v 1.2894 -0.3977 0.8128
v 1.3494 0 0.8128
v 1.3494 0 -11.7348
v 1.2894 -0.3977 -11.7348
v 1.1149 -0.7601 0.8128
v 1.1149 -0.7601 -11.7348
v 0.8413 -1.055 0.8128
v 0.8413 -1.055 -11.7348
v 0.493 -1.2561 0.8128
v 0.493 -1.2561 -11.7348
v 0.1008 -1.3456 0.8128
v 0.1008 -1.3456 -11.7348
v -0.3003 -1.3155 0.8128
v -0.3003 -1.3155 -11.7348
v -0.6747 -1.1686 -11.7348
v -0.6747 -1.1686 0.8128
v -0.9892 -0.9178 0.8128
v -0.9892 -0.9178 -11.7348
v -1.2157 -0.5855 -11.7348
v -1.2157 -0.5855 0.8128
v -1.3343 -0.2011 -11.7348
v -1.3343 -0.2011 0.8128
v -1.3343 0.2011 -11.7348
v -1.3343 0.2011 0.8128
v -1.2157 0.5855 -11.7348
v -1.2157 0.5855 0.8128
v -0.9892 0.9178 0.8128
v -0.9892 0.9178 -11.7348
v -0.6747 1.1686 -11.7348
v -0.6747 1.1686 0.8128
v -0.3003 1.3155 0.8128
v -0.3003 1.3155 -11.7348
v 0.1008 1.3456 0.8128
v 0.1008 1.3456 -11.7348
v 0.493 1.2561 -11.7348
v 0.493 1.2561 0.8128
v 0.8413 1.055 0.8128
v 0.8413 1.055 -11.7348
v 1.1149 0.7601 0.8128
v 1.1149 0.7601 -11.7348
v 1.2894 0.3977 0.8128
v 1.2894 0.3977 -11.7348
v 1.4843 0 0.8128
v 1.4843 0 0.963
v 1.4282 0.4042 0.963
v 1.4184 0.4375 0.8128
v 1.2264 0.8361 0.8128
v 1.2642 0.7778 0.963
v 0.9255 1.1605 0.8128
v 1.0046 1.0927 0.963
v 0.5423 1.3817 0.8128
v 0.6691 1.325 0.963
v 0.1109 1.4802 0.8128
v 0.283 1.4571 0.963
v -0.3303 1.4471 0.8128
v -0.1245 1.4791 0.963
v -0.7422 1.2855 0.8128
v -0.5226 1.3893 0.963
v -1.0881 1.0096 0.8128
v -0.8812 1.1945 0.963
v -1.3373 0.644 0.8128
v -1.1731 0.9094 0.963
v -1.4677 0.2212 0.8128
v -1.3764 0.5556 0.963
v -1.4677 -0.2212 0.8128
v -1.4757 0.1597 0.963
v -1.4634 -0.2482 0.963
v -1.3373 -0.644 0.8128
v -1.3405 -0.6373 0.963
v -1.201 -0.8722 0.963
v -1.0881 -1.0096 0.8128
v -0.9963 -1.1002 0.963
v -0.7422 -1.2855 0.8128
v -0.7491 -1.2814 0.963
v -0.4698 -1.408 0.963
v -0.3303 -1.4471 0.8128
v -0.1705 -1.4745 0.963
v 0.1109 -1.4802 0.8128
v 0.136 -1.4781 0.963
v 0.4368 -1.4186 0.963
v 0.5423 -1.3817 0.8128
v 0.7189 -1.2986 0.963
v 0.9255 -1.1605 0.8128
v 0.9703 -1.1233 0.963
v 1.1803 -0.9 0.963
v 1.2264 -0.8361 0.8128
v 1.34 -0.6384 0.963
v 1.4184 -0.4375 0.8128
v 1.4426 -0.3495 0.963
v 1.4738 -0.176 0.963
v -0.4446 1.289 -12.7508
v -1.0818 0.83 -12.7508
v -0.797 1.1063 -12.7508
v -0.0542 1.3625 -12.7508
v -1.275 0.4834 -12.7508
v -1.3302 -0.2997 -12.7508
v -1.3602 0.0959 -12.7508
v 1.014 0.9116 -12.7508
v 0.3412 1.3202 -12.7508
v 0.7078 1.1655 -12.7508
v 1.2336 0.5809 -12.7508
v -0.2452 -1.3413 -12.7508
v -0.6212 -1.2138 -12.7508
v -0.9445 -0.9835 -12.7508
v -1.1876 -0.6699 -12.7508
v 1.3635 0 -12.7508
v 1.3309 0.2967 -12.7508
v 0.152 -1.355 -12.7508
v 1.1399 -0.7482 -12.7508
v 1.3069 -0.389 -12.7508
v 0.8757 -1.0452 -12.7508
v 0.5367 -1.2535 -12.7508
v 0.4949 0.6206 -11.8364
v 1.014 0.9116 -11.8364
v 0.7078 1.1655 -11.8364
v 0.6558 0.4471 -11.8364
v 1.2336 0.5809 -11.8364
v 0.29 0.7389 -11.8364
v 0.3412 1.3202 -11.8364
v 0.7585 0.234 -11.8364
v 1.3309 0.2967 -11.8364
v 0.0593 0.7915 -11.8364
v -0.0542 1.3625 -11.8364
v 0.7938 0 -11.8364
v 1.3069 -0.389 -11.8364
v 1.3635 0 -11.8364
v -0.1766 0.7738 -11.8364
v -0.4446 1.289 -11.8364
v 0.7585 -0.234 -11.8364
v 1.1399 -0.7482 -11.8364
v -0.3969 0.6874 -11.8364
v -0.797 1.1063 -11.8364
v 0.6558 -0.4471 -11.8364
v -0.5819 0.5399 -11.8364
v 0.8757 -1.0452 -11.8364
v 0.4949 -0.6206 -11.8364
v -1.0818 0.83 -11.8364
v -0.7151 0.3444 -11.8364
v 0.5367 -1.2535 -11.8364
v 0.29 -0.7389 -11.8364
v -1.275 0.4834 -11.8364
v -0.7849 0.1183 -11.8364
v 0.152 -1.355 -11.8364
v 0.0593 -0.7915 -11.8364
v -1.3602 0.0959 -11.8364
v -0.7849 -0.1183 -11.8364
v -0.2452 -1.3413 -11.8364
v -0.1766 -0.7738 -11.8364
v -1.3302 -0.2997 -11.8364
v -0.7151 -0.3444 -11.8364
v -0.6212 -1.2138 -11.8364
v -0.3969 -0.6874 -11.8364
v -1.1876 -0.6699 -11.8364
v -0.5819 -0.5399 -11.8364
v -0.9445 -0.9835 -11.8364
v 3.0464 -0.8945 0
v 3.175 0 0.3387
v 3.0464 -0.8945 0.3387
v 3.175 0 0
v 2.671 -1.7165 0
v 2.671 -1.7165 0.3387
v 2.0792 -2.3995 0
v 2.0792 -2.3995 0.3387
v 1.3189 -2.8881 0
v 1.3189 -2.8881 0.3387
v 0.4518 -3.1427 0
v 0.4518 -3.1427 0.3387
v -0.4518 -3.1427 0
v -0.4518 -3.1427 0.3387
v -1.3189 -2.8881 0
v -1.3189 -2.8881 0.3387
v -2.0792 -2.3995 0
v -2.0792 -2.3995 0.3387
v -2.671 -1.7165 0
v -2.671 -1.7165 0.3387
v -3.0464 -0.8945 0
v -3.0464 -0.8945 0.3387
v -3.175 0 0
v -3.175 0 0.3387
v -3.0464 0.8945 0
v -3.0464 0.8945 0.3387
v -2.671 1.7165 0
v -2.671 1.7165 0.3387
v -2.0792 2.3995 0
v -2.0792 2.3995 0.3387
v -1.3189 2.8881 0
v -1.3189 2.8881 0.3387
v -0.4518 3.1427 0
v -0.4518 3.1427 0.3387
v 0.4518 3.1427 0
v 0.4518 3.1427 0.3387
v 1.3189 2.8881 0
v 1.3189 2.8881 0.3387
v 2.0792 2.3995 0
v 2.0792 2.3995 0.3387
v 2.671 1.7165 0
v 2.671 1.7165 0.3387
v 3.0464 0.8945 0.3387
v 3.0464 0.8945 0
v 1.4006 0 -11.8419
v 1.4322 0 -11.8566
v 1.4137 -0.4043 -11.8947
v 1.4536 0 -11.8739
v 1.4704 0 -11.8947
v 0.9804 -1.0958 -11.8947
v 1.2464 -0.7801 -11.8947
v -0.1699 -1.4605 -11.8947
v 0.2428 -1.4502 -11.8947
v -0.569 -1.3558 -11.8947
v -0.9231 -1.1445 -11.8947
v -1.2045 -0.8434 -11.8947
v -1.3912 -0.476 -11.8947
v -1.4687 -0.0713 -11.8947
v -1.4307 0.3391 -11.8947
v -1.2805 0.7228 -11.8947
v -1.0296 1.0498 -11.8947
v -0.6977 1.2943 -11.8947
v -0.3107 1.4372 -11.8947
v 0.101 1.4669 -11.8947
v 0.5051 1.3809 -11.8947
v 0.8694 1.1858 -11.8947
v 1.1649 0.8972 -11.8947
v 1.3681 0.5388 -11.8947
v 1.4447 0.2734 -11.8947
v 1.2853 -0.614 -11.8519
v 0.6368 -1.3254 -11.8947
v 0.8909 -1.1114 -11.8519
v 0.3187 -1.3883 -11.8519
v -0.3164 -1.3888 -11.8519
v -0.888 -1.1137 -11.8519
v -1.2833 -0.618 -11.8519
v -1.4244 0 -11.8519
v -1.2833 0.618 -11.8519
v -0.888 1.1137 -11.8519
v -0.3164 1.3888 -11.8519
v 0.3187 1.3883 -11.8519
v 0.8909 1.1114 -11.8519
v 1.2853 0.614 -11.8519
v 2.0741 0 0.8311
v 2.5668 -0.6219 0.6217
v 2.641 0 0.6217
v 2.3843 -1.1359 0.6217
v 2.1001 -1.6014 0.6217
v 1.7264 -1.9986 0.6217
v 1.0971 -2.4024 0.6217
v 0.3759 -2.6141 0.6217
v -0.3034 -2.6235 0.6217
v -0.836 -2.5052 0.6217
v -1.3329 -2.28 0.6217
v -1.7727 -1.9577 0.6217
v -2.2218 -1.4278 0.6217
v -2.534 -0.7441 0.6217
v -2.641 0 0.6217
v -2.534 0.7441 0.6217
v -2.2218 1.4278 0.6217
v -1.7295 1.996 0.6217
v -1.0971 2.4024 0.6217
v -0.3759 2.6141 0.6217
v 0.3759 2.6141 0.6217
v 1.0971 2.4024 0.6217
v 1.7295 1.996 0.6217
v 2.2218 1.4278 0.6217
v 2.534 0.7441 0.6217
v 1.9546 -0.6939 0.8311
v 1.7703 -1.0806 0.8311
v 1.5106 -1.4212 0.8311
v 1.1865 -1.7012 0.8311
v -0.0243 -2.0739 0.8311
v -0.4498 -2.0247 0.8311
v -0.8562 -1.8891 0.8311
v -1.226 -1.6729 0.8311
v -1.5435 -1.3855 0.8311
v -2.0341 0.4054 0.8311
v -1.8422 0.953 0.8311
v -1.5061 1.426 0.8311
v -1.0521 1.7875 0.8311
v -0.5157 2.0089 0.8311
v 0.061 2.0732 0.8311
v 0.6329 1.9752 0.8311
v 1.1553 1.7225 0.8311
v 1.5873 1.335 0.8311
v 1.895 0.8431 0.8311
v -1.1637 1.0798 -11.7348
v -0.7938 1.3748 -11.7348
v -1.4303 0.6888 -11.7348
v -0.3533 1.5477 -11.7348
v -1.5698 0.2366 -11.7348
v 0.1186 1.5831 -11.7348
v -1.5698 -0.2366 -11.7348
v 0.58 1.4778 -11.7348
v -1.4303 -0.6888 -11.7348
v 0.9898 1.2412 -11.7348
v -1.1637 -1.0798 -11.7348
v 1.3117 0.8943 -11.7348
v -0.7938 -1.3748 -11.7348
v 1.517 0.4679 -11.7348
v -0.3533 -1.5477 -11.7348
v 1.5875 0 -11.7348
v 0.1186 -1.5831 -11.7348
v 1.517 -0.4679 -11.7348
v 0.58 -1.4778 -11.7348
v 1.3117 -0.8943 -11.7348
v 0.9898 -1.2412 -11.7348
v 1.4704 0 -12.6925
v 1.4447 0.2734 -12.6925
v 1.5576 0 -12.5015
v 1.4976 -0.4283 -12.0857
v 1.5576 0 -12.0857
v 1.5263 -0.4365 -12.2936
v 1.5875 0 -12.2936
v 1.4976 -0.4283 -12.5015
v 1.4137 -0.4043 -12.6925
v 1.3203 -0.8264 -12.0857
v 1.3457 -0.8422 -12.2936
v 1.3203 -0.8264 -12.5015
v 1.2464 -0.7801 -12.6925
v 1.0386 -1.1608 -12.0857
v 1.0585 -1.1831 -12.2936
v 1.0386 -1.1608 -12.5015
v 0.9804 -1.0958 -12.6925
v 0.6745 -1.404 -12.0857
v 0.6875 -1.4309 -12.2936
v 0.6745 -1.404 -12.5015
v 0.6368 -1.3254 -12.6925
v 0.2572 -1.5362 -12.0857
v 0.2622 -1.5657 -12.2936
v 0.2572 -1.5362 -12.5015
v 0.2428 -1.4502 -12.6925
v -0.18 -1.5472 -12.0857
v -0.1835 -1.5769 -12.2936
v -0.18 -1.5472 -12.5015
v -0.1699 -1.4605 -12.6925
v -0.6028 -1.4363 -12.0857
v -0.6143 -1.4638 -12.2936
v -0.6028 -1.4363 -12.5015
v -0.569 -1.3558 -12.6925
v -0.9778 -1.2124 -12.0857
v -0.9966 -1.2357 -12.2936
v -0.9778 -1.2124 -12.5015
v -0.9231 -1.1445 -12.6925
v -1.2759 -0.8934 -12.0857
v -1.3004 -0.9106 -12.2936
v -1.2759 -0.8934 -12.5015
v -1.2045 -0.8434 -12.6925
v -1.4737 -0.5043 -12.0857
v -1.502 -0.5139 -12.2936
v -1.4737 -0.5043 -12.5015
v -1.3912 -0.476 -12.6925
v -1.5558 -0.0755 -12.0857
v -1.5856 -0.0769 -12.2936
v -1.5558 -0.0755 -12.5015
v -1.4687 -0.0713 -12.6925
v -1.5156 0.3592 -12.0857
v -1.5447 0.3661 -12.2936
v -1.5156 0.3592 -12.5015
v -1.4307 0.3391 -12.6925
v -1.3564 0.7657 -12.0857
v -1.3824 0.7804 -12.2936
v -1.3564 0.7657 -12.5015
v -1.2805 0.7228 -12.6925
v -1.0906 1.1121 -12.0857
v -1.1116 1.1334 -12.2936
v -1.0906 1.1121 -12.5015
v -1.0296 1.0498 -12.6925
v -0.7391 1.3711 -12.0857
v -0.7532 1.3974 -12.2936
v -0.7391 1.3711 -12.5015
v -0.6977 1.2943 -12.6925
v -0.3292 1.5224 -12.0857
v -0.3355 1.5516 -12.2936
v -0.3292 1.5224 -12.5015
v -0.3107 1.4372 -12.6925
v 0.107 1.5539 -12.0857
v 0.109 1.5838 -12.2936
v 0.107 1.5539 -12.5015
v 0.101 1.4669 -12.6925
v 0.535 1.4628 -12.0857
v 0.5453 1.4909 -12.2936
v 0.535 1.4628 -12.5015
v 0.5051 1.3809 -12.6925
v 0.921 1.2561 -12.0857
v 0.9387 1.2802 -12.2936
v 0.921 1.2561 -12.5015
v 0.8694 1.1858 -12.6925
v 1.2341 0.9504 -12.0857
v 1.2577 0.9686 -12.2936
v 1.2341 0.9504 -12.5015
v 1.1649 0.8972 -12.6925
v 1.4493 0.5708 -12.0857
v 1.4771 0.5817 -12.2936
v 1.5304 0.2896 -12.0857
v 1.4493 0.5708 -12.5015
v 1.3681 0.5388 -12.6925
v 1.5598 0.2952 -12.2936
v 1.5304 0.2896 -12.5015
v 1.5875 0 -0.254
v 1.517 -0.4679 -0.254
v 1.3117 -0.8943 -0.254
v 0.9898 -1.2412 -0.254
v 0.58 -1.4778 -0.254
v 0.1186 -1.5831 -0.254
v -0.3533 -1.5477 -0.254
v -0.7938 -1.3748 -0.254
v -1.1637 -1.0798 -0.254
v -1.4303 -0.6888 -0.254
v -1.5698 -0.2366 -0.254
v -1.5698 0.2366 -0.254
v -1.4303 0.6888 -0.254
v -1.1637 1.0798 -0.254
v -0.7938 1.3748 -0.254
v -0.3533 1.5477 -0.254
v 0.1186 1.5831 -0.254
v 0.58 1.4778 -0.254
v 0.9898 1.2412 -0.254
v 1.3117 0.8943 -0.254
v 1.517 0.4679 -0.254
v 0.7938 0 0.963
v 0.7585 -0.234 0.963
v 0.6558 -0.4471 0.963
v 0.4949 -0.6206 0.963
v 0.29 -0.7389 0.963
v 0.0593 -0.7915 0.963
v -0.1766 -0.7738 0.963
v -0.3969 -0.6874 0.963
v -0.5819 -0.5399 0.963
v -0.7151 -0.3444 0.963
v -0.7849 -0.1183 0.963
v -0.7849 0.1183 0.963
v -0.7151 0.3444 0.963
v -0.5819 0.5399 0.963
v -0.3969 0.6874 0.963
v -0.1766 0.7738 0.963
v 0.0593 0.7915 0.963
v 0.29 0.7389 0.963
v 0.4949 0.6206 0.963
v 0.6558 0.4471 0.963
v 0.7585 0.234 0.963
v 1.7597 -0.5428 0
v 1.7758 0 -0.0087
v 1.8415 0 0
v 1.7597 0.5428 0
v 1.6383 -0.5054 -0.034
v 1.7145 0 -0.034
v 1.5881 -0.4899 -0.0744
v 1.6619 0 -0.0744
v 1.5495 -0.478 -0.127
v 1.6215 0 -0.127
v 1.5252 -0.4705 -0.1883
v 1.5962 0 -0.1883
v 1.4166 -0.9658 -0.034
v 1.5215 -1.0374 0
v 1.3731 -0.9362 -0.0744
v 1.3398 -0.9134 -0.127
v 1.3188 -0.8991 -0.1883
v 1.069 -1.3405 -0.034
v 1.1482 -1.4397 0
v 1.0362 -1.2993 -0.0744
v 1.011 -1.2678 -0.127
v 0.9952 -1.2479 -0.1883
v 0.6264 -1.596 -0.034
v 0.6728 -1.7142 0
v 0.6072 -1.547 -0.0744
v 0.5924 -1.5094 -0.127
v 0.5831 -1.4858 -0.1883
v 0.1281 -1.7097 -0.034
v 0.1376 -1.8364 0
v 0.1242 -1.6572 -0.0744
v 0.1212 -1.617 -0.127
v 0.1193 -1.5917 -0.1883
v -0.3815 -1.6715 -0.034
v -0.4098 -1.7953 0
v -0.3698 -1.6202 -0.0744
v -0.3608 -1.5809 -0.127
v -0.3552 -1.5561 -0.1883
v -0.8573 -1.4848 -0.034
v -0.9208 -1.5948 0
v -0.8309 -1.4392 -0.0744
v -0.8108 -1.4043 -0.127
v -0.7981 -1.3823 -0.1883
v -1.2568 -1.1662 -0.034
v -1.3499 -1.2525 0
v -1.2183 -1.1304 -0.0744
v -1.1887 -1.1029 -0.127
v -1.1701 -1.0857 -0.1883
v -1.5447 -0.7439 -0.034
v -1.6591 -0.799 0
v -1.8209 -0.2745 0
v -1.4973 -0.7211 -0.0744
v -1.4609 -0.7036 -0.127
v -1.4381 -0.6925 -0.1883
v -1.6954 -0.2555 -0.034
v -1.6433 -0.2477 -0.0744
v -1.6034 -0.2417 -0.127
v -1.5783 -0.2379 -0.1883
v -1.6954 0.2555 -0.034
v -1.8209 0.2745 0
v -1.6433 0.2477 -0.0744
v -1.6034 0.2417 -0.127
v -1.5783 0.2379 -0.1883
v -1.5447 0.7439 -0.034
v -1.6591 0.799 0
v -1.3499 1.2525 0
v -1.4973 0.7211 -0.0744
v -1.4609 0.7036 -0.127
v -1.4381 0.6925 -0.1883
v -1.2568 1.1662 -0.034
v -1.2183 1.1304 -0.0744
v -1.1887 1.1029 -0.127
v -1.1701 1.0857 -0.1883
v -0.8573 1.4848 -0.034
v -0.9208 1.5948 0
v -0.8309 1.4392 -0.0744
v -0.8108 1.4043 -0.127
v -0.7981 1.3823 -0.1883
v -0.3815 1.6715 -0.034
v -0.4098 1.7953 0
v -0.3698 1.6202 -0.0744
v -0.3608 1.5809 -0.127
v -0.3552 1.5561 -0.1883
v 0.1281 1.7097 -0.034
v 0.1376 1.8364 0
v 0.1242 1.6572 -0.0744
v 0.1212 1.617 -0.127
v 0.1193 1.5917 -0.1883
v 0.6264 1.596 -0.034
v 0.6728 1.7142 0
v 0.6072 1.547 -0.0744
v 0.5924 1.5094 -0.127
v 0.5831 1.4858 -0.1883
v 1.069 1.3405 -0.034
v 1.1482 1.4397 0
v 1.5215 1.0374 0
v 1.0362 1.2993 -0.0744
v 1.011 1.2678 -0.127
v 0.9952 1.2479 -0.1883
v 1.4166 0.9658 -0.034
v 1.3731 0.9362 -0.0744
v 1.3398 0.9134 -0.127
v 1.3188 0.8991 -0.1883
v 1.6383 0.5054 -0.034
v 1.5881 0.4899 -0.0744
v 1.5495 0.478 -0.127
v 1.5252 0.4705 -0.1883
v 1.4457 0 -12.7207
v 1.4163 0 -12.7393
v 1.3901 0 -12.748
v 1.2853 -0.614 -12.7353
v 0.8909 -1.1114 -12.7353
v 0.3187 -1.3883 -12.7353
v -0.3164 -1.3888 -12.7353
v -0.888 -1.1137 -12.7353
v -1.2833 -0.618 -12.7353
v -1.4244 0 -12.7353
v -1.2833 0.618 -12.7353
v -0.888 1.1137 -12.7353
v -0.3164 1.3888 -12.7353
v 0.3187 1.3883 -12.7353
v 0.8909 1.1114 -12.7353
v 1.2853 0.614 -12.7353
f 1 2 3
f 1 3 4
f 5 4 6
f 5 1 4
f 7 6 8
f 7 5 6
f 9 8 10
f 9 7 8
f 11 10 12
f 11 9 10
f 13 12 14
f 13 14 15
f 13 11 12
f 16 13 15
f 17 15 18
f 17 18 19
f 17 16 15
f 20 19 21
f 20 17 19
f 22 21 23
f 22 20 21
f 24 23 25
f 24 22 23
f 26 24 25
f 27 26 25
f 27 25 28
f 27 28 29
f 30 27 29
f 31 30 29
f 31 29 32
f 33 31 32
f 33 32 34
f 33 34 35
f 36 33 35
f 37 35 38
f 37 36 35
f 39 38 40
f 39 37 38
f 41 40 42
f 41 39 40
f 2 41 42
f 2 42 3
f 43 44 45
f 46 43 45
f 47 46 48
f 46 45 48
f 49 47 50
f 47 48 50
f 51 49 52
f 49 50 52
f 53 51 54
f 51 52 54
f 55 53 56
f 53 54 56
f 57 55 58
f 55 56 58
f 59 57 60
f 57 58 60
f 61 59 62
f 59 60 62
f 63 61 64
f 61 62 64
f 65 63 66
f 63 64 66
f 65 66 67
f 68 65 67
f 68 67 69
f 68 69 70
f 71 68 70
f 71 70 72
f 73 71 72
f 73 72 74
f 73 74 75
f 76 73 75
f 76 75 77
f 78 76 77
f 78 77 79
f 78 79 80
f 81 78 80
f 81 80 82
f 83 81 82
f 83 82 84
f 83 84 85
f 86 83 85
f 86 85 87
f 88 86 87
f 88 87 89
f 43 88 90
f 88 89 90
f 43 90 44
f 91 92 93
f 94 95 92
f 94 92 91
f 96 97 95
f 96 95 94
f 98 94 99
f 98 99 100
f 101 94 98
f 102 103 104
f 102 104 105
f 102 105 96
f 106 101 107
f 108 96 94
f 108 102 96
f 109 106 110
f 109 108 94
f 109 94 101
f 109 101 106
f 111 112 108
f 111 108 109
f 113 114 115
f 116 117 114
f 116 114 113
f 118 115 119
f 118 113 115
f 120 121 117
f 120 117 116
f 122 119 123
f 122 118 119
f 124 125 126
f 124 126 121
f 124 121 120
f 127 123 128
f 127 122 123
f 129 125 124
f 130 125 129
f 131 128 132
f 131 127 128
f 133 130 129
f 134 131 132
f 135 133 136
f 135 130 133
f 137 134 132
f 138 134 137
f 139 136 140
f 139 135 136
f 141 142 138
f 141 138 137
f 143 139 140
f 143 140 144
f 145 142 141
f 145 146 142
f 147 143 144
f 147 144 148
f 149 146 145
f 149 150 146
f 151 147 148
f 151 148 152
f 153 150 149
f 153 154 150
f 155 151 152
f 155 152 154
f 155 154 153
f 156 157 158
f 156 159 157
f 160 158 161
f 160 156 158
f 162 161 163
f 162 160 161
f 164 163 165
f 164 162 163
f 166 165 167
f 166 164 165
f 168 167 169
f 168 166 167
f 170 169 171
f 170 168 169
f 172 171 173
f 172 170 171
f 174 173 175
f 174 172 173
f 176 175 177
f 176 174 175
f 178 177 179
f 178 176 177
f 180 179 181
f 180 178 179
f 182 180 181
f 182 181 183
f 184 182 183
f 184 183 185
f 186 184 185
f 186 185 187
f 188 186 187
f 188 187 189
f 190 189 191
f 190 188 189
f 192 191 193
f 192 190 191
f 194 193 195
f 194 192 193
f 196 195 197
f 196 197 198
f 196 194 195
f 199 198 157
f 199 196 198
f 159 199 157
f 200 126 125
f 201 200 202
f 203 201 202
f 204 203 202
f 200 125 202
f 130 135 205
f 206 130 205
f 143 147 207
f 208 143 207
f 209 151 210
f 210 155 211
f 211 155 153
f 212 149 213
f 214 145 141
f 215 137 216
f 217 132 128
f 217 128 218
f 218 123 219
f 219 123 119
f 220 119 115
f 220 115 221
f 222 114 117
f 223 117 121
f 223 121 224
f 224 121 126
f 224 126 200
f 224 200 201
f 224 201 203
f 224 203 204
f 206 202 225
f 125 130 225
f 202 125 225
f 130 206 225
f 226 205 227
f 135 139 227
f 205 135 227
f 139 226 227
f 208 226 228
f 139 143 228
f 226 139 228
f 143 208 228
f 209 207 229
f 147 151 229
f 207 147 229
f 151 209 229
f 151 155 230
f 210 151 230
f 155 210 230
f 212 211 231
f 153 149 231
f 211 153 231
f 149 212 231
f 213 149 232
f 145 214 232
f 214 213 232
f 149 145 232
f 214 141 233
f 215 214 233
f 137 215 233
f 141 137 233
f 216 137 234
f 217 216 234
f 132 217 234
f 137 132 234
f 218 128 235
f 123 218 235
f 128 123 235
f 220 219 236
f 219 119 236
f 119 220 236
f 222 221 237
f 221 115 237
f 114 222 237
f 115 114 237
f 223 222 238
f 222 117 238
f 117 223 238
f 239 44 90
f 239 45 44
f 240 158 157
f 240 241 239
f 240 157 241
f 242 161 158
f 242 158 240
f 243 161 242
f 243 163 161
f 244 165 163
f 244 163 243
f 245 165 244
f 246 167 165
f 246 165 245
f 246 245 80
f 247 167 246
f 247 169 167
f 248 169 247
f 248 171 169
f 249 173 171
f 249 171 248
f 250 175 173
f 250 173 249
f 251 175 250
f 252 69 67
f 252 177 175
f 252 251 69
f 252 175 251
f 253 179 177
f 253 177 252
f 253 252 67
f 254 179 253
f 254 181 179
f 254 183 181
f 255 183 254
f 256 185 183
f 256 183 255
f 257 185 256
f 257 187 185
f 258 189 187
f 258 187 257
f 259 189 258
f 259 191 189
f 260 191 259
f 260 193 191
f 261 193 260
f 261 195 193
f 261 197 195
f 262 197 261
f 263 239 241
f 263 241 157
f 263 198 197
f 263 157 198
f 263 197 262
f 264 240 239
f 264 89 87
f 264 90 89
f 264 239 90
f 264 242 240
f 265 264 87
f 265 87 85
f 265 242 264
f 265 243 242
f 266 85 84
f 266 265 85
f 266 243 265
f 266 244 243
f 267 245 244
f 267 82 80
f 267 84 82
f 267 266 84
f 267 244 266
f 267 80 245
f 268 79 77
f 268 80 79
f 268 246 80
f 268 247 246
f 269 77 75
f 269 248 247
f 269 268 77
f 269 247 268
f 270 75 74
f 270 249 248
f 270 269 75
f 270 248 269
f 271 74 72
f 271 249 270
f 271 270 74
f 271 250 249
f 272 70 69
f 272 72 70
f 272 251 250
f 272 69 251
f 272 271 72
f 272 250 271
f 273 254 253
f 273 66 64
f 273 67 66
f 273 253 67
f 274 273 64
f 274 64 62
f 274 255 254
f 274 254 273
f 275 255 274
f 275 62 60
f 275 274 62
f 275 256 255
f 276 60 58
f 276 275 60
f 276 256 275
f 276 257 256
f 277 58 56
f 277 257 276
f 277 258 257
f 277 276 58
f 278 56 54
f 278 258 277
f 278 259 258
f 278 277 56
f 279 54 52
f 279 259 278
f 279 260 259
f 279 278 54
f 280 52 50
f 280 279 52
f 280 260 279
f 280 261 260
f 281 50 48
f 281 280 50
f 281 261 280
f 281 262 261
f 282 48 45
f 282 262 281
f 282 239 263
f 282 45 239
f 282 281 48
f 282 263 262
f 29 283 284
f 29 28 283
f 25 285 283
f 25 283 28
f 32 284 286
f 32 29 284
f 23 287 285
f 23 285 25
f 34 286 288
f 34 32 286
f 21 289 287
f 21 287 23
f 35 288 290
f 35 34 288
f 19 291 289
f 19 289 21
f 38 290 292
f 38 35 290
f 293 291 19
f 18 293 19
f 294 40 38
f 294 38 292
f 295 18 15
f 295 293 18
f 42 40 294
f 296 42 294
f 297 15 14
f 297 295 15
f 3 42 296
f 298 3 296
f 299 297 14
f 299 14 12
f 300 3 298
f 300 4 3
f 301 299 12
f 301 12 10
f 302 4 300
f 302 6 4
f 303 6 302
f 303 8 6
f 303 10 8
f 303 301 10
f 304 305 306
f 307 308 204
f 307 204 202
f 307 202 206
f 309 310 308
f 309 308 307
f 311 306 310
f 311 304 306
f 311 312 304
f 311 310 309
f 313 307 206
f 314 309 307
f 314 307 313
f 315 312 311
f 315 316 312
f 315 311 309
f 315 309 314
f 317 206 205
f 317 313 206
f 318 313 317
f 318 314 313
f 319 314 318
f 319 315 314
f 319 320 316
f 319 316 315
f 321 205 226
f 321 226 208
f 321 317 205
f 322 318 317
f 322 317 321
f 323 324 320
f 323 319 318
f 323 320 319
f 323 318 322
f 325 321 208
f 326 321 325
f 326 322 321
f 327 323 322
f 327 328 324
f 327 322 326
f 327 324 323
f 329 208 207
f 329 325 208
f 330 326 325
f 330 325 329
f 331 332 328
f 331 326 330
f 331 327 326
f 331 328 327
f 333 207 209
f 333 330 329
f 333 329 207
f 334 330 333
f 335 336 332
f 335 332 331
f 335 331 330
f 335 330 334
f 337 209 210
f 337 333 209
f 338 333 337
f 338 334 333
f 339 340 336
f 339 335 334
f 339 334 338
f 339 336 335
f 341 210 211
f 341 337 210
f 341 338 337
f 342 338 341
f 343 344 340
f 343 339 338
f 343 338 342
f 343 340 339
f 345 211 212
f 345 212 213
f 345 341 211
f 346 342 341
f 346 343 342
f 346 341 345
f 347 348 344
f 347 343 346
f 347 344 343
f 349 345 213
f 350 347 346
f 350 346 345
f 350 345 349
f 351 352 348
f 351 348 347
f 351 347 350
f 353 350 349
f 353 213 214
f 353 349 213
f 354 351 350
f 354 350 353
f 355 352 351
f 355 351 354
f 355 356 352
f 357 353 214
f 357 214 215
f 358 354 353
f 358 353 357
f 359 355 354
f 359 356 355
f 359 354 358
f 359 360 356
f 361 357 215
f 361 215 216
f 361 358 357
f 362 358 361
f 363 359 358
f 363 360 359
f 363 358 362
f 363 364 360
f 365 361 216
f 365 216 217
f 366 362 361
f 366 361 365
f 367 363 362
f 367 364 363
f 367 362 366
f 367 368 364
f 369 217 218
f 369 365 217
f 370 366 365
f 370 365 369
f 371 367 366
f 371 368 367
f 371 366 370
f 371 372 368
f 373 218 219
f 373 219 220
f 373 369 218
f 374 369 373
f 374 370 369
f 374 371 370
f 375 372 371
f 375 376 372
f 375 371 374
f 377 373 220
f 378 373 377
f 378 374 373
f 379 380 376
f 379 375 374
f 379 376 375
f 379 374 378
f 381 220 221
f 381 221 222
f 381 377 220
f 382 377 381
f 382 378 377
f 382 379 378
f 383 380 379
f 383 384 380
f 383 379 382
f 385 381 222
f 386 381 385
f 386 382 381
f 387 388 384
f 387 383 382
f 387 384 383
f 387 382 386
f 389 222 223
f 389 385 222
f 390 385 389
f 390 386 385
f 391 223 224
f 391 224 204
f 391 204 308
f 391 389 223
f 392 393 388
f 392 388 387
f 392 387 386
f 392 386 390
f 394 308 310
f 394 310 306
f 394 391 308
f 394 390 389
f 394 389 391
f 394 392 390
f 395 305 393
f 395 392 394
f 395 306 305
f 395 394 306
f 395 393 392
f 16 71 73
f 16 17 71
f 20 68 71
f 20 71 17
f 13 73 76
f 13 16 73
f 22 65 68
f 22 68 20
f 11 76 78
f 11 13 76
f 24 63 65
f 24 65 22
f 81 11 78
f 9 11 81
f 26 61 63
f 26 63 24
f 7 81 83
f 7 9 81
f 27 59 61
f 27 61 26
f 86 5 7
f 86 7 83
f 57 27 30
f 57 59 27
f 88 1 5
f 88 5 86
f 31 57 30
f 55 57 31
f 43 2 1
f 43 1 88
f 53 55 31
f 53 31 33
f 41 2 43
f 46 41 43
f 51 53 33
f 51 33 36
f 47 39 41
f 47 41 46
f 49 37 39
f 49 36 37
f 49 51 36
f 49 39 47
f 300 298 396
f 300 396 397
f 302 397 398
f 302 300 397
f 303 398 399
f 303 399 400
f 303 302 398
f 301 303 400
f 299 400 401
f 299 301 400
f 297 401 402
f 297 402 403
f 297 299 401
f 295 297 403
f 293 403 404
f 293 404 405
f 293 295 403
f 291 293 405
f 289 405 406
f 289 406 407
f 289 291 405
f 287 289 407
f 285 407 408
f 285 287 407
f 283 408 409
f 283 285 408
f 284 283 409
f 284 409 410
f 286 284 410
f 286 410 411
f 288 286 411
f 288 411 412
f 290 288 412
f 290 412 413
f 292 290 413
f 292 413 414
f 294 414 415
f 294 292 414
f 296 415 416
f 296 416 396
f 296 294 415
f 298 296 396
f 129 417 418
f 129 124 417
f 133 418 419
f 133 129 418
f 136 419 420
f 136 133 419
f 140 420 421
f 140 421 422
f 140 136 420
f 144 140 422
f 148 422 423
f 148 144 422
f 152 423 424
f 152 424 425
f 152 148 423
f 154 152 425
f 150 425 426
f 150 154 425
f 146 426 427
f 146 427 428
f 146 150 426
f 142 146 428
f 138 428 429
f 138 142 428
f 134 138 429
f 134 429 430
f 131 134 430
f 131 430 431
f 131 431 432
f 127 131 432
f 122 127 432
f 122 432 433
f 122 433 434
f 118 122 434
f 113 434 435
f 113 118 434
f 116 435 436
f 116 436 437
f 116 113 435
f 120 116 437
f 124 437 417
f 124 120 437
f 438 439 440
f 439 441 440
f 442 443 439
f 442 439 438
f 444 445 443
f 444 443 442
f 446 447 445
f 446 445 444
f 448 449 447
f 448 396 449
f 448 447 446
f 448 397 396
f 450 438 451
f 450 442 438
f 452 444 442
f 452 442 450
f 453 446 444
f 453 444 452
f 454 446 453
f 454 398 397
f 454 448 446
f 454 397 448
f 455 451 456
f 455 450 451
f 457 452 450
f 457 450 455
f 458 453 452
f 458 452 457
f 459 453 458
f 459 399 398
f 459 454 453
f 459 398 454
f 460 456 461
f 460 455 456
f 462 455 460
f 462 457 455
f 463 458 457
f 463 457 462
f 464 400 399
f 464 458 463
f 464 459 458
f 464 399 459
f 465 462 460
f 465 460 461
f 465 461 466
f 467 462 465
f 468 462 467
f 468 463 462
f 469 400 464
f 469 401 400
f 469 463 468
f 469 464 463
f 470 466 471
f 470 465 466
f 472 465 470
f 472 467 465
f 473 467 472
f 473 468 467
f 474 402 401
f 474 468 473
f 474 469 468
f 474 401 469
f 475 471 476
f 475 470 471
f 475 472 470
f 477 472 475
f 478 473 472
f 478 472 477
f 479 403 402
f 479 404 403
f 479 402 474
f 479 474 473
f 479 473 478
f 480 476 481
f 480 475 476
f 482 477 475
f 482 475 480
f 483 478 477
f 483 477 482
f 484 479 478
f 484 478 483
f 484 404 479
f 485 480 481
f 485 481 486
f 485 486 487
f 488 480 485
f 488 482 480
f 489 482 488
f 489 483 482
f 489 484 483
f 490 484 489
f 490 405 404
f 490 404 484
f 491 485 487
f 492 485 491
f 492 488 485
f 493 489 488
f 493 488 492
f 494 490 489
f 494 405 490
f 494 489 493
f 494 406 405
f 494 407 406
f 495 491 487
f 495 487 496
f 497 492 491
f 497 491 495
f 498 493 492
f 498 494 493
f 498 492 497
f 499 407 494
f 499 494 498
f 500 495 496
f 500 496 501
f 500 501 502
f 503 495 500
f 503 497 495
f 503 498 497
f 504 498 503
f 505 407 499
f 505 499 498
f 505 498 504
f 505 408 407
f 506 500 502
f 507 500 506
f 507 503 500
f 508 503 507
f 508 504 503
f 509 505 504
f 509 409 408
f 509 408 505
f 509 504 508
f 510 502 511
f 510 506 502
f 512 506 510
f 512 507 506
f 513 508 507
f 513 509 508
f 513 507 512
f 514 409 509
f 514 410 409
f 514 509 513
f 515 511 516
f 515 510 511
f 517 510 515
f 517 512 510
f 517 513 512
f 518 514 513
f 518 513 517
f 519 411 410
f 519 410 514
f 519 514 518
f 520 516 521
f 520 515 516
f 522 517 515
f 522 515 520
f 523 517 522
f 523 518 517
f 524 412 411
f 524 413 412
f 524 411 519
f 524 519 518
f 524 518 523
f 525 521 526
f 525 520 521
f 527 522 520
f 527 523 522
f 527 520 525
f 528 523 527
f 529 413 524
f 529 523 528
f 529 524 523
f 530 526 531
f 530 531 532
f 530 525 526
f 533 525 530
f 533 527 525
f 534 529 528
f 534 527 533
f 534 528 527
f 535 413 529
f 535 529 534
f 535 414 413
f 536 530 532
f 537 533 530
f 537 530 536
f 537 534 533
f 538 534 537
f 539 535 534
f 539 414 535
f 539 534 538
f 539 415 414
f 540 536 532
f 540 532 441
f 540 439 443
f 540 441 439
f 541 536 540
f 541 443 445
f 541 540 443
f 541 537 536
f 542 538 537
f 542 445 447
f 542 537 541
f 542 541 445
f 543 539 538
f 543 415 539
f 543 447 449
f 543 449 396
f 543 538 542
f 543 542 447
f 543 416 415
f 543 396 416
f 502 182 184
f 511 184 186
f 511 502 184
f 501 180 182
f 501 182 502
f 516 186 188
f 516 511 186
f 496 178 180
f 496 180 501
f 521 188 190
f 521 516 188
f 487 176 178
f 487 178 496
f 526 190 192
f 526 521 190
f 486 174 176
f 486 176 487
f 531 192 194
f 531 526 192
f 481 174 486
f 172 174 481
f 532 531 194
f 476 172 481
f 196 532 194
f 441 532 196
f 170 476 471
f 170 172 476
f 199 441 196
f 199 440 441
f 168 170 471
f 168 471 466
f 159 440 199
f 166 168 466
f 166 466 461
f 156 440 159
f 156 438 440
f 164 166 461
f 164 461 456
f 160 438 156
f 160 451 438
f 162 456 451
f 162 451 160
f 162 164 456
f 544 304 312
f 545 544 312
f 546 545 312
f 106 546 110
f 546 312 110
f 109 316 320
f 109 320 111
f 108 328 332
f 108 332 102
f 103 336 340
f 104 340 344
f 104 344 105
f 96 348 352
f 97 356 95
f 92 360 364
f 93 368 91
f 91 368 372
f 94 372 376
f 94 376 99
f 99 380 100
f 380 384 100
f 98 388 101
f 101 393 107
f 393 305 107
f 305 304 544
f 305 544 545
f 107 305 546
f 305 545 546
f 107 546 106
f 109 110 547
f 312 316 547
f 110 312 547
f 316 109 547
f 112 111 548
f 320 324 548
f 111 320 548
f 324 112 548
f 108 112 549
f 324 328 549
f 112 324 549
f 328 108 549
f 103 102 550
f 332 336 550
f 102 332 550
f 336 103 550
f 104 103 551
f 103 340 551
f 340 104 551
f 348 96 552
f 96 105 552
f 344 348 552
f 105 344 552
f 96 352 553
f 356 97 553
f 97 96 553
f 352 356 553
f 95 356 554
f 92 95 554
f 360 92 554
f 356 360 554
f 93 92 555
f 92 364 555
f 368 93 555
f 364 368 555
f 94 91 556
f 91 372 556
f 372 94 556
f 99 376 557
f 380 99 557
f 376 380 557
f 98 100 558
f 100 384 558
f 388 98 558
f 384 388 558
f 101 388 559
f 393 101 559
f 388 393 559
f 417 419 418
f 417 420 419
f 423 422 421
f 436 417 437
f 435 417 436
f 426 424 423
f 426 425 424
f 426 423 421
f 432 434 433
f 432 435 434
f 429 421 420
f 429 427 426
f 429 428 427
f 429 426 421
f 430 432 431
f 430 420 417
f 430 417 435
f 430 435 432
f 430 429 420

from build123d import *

# Parameters (mm, degrees)
FILLET3_R               = 0.127
SKETCH5_R               = 1.4843125
CUT_EXTRUDE2_DEPTH      = 0.2032
CUT_EXTRUDE1_DEPTH      = 25.893891994
CUT_EXTRUDE1_DEPTH_BACK = 25.893891994
FILLET2_R               = 0.254
CUT_EXTRUDE3_DEPTH      = 25.893891994
CUT_EXTRUDE3_DEPTH_BACK = 25.893891994
SKETCH6_W               = 23.522610405
SKETCH6_H               = 3.175


with BuildPart() as part:
    # Sketch2 → Revolve1 (revolve)
    with BuildSketch(Plane(origin=(0, 0, 0), x_dir=(0, 0, -1), z_dir=(1, 0, 0)), mode=Mode.PRIVATE) as revolve1_sk:
        with BuildLine():
            Line((-24.4856, 0), (-24.4856, 0.79375))
            Line((-24.4856, 0.79375), (-1.016, 0.79375))
            Line((-1.016, 0.79375), (11.8364, 0.79375))
            Line((11.8364, 0.79375), (11.8364, 1.42875))
            ThreePointArc((11.8364, 1.42875), (12.2936, 1.5875), (12.7508, 1.42875))
            Line((12.7508, 1.42875), (12.7508, 0))
            Line((12.7508, 0), (-24.4856, 0))
        make_face()
    revolve(revolve1_sk.sketch.rotate(Axis((0, 0, 24.4856), (0, 0, -1)), 90), axis=Axis((0, 0, 24.4856), (0, 0, -1)))

    # Fillet3
    fillet3_edges = [part.edges().sort_by_distance(p)[0] for p in [
        (-1.42875, 0, -11.8364),
        (-1.42875, 0, -12.7508),
    ]]
    fillet(fillet3_edges, radius=FILLET3_R)

    # Sketch3 → Cut-Extrude1 (cut, two sides: drawn at the far end of the back side and taken through both)
    with BuildSketch(Plane(origin=(0, 0, 0), x_dir=(1, 0, 0), z_dir=(0, 1, 0)).offset(-CUT_EXTRUDE1_DEPTH_BACK)):
        Polygon((0, -24.4856), (0.99695, -23.186349465), (0.99695, -24.9936), (-0.99695, -24.9936), (-0.99695, -23.186349465), align=None)
    extrude(amount=CUT_EXTRUDE1_DEPTH + CUT_EXTRUDE1_DEPTH_BACK, mode=Mode.SUBTRACT)

    # Sketch6 → Cut-Extrude3 (cut, two sides: drawn at the far end of the back side and taken through both)
    with BuildSketch(Plane(origin=(0, 0, 0), x_dir=(0, 0, -1), z_dir=(1, 0, 0)).offset(-CUT_EXTRUDE3_DEPTH_BACK)):
        with Locations((-12.724294798, 0)):
            Rectangle(SKETCH6_W, SKETCH6_H)
    extrude(amount=CUT_EXTRUDE3_DEPTH + CUT_EXTRUDE3_DEPTH_BACK, mode=Mode.SUBTRACT)


with BuildPart() as body_2:
    # Sketch4 → Revolve2 (revolve)
    with BuildSketch(Plane(origin=(0, 0, 0), x_dir=(0, 0, -1), z_dir=(1, 0, 0)), mode=Mode.PRIVATE) as revolve2_sk:
        with BuildLine():
            Line((-0.338666667, 3.175), (0, 3.175))
            Line((0, 3.175), (0, 1.5875))
            Line((0, 1.5875), (11.7348, 1.5875))
            Line((11.7348, 1.5875), (11.7348, 1.349375))
            Line((11.7348, 1.349375), (-0.981753691, 1.349375))
            ThreePointArc((-0.981753691, 1.349375), (-0.7589793, 2.296979497), (-0.338666667, 3.175))
        make_face()
    revolve(revolve2_sk.sketch.rotate(Axis((0, 0, 0), (0, 0, -1)), 90), axis=Axis((0, 0, 0), (0, 0, -1)))

    # Sketch5 → Cut-Extrude2 (cut)
    with BuildSketch(Plane.XY.offset(1.016)):
        Circle(SKETCH5_R)
    extrude(amount=-CUT_EXTRUDE2_DEPTH, mode=Mode.SUBTRACT)

    # Fillet2
    fillet2_edges = [body_2.edges().sort_by_distance(p)[0] for p in [
        (-1.5875, 0, 0),
    ]]
    fillet(fillet2_edges, radius=FILLET2_R)


solid = Compound([part.part, body_2.part])
